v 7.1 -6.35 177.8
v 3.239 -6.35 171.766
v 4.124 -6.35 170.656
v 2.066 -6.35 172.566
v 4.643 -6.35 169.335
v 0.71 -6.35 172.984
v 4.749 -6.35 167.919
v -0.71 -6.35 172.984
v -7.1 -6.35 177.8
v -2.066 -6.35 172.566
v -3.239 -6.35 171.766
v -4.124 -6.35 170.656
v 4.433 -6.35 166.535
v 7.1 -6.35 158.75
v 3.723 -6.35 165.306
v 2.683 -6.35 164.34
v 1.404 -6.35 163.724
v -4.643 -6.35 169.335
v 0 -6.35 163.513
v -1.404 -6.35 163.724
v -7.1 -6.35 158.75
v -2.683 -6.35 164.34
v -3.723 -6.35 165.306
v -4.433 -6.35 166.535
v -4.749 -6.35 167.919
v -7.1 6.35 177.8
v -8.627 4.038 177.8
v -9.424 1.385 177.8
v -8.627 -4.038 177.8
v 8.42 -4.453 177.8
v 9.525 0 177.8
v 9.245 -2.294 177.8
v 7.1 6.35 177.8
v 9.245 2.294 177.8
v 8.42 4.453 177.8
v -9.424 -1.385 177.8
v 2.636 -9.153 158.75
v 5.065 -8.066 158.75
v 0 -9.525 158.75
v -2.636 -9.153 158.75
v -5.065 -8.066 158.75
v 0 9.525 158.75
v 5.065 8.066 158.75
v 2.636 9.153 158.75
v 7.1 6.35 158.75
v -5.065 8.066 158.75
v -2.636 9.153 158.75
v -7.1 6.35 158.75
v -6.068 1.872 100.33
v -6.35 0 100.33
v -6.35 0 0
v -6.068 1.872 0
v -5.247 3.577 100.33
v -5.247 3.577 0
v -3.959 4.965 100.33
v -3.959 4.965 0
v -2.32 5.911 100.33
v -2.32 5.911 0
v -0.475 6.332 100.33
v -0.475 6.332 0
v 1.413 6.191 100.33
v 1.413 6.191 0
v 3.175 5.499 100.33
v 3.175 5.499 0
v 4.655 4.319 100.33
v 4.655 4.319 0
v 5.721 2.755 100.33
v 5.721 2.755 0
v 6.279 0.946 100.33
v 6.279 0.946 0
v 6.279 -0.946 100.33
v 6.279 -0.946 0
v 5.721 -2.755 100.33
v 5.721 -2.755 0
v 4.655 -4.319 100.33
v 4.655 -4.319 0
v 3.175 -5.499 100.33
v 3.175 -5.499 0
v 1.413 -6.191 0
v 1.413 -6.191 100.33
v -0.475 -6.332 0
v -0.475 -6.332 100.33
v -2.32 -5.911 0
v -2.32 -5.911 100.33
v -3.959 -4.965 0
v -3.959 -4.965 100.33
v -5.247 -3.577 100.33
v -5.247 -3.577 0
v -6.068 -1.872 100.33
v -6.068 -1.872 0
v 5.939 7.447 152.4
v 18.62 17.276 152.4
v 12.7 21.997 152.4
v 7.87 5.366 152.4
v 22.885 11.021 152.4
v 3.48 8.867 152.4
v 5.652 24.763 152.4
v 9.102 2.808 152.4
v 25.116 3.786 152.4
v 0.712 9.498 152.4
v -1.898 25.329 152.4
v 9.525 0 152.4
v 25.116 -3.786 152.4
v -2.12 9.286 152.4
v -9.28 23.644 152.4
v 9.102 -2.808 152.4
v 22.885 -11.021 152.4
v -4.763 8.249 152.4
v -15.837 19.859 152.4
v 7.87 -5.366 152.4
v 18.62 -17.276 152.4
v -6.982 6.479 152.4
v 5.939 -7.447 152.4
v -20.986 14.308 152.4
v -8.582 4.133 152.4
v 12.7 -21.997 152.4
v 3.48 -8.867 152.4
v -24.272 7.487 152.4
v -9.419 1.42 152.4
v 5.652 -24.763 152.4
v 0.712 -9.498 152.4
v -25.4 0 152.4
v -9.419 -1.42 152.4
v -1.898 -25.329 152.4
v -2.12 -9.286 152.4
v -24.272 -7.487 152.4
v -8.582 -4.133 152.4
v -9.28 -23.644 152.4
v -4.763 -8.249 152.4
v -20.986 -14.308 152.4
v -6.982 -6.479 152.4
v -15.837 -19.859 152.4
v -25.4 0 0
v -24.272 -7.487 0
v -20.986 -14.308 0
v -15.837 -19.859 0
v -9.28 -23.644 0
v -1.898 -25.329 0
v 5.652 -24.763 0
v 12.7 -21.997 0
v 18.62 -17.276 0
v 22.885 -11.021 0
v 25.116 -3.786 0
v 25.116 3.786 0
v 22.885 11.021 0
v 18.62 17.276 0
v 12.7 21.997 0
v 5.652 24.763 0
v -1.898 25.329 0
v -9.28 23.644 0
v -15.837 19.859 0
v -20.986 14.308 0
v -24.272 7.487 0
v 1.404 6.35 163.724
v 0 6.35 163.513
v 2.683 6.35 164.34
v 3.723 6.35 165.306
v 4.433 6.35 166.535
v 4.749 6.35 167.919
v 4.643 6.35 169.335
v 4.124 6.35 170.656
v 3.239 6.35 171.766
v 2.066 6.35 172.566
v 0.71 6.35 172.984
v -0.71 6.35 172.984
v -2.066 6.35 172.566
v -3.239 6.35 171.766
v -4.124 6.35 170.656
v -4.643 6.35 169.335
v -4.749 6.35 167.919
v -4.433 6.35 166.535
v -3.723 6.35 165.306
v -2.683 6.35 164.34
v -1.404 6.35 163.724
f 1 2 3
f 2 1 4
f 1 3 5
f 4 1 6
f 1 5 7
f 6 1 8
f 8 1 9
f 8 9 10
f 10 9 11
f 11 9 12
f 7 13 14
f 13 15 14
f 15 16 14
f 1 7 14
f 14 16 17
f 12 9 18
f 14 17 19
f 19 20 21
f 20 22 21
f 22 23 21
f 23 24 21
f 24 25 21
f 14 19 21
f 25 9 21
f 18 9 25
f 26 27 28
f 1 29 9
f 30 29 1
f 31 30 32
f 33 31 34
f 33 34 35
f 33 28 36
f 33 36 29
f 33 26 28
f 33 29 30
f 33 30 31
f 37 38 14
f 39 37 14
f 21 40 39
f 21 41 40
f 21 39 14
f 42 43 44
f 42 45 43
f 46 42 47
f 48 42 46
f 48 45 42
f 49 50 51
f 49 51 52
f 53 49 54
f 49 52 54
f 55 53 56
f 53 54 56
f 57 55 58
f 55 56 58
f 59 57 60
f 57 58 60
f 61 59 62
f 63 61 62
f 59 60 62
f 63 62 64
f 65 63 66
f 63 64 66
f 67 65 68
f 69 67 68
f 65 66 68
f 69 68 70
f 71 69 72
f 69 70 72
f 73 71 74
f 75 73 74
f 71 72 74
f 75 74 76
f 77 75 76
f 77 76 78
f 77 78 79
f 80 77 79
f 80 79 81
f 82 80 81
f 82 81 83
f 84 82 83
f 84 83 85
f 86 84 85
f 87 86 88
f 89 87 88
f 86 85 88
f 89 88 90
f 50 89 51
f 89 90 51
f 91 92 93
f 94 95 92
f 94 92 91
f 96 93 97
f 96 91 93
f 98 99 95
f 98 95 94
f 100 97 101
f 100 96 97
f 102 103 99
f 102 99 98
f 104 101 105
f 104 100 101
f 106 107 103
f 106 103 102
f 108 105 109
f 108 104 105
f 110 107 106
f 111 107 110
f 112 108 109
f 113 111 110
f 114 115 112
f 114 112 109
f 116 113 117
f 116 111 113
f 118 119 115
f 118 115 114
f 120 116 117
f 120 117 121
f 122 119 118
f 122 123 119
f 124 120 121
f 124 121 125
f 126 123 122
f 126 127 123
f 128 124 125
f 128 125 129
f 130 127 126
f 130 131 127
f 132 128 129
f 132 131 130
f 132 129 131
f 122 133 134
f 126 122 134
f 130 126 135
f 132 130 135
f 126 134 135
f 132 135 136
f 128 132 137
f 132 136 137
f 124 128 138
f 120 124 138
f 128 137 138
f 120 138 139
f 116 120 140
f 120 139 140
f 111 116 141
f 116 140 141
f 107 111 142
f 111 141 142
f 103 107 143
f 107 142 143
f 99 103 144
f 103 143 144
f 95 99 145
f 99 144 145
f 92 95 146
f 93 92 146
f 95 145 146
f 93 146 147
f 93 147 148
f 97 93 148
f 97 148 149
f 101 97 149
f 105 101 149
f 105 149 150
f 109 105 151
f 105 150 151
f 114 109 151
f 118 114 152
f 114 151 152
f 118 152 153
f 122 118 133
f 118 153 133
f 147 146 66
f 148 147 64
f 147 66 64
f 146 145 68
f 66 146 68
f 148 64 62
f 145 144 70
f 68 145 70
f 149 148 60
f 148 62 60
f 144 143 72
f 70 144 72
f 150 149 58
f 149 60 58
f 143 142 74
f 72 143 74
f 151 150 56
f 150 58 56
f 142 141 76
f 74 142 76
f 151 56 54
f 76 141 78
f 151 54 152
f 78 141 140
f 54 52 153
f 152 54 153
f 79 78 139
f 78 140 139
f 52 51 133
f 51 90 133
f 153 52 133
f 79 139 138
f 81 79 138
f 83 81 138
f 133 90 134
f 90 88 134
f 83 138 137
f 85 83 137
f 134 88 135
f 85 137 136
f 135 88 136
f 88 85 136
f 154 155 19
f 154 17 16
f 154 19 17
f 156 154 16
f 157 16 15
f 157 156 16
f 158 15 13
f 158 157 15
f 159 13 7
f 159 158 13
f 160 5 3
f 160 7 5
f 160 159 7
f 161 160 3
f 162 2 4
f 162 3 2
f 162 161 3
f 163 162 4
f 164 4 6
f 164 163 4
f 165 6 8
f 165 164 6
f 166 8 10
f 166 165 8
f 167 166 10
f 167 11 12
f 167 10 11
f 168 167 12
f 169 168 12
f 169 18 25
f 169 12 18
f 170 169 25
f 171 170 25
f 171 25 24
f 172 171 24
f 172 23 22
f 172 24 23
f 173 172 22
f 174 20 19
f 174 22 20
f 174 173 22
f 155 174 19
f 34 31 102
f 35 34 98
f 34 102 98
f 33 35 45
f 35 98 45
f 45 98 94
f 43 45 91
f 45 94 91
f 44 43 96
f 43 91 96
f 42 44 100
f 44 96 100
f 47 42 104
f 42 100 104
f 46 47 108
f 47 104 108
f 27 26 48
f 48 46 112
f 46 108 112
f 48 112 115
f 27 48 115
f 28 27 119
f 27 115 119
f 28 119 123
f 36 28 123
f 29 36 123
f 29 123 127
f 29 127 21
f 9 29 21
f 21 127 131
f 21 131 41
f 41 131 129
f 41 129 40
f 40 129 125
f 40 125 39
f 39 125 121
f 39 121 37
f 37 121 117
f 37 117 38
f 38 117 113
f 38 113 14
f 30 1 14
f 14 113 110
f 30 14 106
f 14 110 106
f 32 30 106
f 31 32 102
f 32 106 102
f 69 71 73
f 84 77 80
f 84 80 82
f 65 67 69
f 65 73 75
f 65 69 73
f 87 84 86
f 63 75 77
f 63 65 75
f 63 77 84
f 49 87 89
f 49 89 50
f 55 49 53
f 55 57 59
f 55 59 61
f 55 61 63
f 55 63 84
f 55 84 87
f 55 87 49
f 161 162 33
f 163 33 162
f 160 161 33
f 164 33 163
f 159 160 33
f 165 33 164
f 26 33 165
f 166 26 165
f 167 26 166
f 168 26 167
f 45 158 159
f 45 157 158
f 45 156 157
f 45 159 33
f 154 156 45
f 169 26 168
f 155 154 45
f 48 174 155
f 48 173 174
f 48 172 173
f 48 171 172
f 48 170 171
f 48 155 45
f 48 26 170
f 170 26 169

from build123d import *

# Parameters (mm, degrees)
SKETCH1_R               = 25.4
BOSS_EXTRUDE1_DEPTH     = 152.4
SKETCH2_R               = 9.525
BOSS_EXTRUDE2_DEPTH     = 25.4
SKETCH3_R               = 6.35
CUT_EXTRUDE1_DEPTH      = 100.33
CUT_EXTRUDE2_DEPTH      = 182.392282085
CUT_EXTRUDE2_DEPTH_BACK = 182.392282085
SKETCH4_W               = 19.05
SKETCH4_H               = 3.175
CUT_EXTRUDE3_DEPTH      = 183.389864028
CUT_EXTRUDE3_DEPTH_BACK = 183.389864028
SKETCH5_R               = 4.7625


with BuildPart() as part:
    # Sketch1 → Boss-Extrude1 (new body)
    with BuildSketch(Plane.XY):
        with Locations(Location((0, 0, 0), (0, 0, 180))):
            Circle(SKETCH1_R)
    extrude(amount=BOSS_EXTRUDE1_DEPTH)

    # Sketch2 → Boss-Extrude2 (add)
    with BuildSketch(Plane.XY.offset(152.4)):
        Circle(SKETCH2_R)
    extrude(amount=BOSS_EXTRUDE2_DEPTH)

    # Sketch3 → Cut-Extrude1 (cut)
    with BuildSketch(Plane(origin=(0, 0, 0), x_dir=(-1, 0, 0), z_dir=(0, 0, -1))):
        Circle(SKETCH3_R)
    extrude(amount=-CUT_EXTRUDE1_DEPTH, mode=Mode.SUBTRACT)

    # Sketch4 → Cut-Extrude2 (cut, two sides: drawn at the far end of the back side and taken through both)
    with BuildSketch(Plane(origin=(0, 0, 0), x_dir=(0, 0, -1), z_dir=(1, 0, 0)).offset(-CUT_EXTRUDE2_DEPTH_BACK)):
        with Locations((-168.275, 7.9375)):
            Rectangle(SKETCH4_W, SKETCH4_H)
        with Locations((-168.275, -7.9375)):
            Rectangle(SKETCH4_W, SKETCH4_H)
    extrude(amount=CUT_EXTRUDE2_DEPTH + CUT_EXTRUDE2_DEPTH_BACK, mode=Mode.SUBTRACT)

    # Sketch5 → Cut-Extrude3 (cut, two sides: drawn at the far end of the back side and taken through both)
    with BuildSketch(Plane.XZ.offset(6.35).offset(-CUT_EXTRUDE3_DEPTH_BACK)):
        with Locations(Location((0, 168.275, 0), (0, 0, 270))):
            Circle(SKETCH5_R)
    extrude(amount=CUT_EXTRUDE3_DEPTH + CUT_EXTRUDE3_DEPTH_BACK, mode=Mode.SUBTRACT)


solid = part.part
